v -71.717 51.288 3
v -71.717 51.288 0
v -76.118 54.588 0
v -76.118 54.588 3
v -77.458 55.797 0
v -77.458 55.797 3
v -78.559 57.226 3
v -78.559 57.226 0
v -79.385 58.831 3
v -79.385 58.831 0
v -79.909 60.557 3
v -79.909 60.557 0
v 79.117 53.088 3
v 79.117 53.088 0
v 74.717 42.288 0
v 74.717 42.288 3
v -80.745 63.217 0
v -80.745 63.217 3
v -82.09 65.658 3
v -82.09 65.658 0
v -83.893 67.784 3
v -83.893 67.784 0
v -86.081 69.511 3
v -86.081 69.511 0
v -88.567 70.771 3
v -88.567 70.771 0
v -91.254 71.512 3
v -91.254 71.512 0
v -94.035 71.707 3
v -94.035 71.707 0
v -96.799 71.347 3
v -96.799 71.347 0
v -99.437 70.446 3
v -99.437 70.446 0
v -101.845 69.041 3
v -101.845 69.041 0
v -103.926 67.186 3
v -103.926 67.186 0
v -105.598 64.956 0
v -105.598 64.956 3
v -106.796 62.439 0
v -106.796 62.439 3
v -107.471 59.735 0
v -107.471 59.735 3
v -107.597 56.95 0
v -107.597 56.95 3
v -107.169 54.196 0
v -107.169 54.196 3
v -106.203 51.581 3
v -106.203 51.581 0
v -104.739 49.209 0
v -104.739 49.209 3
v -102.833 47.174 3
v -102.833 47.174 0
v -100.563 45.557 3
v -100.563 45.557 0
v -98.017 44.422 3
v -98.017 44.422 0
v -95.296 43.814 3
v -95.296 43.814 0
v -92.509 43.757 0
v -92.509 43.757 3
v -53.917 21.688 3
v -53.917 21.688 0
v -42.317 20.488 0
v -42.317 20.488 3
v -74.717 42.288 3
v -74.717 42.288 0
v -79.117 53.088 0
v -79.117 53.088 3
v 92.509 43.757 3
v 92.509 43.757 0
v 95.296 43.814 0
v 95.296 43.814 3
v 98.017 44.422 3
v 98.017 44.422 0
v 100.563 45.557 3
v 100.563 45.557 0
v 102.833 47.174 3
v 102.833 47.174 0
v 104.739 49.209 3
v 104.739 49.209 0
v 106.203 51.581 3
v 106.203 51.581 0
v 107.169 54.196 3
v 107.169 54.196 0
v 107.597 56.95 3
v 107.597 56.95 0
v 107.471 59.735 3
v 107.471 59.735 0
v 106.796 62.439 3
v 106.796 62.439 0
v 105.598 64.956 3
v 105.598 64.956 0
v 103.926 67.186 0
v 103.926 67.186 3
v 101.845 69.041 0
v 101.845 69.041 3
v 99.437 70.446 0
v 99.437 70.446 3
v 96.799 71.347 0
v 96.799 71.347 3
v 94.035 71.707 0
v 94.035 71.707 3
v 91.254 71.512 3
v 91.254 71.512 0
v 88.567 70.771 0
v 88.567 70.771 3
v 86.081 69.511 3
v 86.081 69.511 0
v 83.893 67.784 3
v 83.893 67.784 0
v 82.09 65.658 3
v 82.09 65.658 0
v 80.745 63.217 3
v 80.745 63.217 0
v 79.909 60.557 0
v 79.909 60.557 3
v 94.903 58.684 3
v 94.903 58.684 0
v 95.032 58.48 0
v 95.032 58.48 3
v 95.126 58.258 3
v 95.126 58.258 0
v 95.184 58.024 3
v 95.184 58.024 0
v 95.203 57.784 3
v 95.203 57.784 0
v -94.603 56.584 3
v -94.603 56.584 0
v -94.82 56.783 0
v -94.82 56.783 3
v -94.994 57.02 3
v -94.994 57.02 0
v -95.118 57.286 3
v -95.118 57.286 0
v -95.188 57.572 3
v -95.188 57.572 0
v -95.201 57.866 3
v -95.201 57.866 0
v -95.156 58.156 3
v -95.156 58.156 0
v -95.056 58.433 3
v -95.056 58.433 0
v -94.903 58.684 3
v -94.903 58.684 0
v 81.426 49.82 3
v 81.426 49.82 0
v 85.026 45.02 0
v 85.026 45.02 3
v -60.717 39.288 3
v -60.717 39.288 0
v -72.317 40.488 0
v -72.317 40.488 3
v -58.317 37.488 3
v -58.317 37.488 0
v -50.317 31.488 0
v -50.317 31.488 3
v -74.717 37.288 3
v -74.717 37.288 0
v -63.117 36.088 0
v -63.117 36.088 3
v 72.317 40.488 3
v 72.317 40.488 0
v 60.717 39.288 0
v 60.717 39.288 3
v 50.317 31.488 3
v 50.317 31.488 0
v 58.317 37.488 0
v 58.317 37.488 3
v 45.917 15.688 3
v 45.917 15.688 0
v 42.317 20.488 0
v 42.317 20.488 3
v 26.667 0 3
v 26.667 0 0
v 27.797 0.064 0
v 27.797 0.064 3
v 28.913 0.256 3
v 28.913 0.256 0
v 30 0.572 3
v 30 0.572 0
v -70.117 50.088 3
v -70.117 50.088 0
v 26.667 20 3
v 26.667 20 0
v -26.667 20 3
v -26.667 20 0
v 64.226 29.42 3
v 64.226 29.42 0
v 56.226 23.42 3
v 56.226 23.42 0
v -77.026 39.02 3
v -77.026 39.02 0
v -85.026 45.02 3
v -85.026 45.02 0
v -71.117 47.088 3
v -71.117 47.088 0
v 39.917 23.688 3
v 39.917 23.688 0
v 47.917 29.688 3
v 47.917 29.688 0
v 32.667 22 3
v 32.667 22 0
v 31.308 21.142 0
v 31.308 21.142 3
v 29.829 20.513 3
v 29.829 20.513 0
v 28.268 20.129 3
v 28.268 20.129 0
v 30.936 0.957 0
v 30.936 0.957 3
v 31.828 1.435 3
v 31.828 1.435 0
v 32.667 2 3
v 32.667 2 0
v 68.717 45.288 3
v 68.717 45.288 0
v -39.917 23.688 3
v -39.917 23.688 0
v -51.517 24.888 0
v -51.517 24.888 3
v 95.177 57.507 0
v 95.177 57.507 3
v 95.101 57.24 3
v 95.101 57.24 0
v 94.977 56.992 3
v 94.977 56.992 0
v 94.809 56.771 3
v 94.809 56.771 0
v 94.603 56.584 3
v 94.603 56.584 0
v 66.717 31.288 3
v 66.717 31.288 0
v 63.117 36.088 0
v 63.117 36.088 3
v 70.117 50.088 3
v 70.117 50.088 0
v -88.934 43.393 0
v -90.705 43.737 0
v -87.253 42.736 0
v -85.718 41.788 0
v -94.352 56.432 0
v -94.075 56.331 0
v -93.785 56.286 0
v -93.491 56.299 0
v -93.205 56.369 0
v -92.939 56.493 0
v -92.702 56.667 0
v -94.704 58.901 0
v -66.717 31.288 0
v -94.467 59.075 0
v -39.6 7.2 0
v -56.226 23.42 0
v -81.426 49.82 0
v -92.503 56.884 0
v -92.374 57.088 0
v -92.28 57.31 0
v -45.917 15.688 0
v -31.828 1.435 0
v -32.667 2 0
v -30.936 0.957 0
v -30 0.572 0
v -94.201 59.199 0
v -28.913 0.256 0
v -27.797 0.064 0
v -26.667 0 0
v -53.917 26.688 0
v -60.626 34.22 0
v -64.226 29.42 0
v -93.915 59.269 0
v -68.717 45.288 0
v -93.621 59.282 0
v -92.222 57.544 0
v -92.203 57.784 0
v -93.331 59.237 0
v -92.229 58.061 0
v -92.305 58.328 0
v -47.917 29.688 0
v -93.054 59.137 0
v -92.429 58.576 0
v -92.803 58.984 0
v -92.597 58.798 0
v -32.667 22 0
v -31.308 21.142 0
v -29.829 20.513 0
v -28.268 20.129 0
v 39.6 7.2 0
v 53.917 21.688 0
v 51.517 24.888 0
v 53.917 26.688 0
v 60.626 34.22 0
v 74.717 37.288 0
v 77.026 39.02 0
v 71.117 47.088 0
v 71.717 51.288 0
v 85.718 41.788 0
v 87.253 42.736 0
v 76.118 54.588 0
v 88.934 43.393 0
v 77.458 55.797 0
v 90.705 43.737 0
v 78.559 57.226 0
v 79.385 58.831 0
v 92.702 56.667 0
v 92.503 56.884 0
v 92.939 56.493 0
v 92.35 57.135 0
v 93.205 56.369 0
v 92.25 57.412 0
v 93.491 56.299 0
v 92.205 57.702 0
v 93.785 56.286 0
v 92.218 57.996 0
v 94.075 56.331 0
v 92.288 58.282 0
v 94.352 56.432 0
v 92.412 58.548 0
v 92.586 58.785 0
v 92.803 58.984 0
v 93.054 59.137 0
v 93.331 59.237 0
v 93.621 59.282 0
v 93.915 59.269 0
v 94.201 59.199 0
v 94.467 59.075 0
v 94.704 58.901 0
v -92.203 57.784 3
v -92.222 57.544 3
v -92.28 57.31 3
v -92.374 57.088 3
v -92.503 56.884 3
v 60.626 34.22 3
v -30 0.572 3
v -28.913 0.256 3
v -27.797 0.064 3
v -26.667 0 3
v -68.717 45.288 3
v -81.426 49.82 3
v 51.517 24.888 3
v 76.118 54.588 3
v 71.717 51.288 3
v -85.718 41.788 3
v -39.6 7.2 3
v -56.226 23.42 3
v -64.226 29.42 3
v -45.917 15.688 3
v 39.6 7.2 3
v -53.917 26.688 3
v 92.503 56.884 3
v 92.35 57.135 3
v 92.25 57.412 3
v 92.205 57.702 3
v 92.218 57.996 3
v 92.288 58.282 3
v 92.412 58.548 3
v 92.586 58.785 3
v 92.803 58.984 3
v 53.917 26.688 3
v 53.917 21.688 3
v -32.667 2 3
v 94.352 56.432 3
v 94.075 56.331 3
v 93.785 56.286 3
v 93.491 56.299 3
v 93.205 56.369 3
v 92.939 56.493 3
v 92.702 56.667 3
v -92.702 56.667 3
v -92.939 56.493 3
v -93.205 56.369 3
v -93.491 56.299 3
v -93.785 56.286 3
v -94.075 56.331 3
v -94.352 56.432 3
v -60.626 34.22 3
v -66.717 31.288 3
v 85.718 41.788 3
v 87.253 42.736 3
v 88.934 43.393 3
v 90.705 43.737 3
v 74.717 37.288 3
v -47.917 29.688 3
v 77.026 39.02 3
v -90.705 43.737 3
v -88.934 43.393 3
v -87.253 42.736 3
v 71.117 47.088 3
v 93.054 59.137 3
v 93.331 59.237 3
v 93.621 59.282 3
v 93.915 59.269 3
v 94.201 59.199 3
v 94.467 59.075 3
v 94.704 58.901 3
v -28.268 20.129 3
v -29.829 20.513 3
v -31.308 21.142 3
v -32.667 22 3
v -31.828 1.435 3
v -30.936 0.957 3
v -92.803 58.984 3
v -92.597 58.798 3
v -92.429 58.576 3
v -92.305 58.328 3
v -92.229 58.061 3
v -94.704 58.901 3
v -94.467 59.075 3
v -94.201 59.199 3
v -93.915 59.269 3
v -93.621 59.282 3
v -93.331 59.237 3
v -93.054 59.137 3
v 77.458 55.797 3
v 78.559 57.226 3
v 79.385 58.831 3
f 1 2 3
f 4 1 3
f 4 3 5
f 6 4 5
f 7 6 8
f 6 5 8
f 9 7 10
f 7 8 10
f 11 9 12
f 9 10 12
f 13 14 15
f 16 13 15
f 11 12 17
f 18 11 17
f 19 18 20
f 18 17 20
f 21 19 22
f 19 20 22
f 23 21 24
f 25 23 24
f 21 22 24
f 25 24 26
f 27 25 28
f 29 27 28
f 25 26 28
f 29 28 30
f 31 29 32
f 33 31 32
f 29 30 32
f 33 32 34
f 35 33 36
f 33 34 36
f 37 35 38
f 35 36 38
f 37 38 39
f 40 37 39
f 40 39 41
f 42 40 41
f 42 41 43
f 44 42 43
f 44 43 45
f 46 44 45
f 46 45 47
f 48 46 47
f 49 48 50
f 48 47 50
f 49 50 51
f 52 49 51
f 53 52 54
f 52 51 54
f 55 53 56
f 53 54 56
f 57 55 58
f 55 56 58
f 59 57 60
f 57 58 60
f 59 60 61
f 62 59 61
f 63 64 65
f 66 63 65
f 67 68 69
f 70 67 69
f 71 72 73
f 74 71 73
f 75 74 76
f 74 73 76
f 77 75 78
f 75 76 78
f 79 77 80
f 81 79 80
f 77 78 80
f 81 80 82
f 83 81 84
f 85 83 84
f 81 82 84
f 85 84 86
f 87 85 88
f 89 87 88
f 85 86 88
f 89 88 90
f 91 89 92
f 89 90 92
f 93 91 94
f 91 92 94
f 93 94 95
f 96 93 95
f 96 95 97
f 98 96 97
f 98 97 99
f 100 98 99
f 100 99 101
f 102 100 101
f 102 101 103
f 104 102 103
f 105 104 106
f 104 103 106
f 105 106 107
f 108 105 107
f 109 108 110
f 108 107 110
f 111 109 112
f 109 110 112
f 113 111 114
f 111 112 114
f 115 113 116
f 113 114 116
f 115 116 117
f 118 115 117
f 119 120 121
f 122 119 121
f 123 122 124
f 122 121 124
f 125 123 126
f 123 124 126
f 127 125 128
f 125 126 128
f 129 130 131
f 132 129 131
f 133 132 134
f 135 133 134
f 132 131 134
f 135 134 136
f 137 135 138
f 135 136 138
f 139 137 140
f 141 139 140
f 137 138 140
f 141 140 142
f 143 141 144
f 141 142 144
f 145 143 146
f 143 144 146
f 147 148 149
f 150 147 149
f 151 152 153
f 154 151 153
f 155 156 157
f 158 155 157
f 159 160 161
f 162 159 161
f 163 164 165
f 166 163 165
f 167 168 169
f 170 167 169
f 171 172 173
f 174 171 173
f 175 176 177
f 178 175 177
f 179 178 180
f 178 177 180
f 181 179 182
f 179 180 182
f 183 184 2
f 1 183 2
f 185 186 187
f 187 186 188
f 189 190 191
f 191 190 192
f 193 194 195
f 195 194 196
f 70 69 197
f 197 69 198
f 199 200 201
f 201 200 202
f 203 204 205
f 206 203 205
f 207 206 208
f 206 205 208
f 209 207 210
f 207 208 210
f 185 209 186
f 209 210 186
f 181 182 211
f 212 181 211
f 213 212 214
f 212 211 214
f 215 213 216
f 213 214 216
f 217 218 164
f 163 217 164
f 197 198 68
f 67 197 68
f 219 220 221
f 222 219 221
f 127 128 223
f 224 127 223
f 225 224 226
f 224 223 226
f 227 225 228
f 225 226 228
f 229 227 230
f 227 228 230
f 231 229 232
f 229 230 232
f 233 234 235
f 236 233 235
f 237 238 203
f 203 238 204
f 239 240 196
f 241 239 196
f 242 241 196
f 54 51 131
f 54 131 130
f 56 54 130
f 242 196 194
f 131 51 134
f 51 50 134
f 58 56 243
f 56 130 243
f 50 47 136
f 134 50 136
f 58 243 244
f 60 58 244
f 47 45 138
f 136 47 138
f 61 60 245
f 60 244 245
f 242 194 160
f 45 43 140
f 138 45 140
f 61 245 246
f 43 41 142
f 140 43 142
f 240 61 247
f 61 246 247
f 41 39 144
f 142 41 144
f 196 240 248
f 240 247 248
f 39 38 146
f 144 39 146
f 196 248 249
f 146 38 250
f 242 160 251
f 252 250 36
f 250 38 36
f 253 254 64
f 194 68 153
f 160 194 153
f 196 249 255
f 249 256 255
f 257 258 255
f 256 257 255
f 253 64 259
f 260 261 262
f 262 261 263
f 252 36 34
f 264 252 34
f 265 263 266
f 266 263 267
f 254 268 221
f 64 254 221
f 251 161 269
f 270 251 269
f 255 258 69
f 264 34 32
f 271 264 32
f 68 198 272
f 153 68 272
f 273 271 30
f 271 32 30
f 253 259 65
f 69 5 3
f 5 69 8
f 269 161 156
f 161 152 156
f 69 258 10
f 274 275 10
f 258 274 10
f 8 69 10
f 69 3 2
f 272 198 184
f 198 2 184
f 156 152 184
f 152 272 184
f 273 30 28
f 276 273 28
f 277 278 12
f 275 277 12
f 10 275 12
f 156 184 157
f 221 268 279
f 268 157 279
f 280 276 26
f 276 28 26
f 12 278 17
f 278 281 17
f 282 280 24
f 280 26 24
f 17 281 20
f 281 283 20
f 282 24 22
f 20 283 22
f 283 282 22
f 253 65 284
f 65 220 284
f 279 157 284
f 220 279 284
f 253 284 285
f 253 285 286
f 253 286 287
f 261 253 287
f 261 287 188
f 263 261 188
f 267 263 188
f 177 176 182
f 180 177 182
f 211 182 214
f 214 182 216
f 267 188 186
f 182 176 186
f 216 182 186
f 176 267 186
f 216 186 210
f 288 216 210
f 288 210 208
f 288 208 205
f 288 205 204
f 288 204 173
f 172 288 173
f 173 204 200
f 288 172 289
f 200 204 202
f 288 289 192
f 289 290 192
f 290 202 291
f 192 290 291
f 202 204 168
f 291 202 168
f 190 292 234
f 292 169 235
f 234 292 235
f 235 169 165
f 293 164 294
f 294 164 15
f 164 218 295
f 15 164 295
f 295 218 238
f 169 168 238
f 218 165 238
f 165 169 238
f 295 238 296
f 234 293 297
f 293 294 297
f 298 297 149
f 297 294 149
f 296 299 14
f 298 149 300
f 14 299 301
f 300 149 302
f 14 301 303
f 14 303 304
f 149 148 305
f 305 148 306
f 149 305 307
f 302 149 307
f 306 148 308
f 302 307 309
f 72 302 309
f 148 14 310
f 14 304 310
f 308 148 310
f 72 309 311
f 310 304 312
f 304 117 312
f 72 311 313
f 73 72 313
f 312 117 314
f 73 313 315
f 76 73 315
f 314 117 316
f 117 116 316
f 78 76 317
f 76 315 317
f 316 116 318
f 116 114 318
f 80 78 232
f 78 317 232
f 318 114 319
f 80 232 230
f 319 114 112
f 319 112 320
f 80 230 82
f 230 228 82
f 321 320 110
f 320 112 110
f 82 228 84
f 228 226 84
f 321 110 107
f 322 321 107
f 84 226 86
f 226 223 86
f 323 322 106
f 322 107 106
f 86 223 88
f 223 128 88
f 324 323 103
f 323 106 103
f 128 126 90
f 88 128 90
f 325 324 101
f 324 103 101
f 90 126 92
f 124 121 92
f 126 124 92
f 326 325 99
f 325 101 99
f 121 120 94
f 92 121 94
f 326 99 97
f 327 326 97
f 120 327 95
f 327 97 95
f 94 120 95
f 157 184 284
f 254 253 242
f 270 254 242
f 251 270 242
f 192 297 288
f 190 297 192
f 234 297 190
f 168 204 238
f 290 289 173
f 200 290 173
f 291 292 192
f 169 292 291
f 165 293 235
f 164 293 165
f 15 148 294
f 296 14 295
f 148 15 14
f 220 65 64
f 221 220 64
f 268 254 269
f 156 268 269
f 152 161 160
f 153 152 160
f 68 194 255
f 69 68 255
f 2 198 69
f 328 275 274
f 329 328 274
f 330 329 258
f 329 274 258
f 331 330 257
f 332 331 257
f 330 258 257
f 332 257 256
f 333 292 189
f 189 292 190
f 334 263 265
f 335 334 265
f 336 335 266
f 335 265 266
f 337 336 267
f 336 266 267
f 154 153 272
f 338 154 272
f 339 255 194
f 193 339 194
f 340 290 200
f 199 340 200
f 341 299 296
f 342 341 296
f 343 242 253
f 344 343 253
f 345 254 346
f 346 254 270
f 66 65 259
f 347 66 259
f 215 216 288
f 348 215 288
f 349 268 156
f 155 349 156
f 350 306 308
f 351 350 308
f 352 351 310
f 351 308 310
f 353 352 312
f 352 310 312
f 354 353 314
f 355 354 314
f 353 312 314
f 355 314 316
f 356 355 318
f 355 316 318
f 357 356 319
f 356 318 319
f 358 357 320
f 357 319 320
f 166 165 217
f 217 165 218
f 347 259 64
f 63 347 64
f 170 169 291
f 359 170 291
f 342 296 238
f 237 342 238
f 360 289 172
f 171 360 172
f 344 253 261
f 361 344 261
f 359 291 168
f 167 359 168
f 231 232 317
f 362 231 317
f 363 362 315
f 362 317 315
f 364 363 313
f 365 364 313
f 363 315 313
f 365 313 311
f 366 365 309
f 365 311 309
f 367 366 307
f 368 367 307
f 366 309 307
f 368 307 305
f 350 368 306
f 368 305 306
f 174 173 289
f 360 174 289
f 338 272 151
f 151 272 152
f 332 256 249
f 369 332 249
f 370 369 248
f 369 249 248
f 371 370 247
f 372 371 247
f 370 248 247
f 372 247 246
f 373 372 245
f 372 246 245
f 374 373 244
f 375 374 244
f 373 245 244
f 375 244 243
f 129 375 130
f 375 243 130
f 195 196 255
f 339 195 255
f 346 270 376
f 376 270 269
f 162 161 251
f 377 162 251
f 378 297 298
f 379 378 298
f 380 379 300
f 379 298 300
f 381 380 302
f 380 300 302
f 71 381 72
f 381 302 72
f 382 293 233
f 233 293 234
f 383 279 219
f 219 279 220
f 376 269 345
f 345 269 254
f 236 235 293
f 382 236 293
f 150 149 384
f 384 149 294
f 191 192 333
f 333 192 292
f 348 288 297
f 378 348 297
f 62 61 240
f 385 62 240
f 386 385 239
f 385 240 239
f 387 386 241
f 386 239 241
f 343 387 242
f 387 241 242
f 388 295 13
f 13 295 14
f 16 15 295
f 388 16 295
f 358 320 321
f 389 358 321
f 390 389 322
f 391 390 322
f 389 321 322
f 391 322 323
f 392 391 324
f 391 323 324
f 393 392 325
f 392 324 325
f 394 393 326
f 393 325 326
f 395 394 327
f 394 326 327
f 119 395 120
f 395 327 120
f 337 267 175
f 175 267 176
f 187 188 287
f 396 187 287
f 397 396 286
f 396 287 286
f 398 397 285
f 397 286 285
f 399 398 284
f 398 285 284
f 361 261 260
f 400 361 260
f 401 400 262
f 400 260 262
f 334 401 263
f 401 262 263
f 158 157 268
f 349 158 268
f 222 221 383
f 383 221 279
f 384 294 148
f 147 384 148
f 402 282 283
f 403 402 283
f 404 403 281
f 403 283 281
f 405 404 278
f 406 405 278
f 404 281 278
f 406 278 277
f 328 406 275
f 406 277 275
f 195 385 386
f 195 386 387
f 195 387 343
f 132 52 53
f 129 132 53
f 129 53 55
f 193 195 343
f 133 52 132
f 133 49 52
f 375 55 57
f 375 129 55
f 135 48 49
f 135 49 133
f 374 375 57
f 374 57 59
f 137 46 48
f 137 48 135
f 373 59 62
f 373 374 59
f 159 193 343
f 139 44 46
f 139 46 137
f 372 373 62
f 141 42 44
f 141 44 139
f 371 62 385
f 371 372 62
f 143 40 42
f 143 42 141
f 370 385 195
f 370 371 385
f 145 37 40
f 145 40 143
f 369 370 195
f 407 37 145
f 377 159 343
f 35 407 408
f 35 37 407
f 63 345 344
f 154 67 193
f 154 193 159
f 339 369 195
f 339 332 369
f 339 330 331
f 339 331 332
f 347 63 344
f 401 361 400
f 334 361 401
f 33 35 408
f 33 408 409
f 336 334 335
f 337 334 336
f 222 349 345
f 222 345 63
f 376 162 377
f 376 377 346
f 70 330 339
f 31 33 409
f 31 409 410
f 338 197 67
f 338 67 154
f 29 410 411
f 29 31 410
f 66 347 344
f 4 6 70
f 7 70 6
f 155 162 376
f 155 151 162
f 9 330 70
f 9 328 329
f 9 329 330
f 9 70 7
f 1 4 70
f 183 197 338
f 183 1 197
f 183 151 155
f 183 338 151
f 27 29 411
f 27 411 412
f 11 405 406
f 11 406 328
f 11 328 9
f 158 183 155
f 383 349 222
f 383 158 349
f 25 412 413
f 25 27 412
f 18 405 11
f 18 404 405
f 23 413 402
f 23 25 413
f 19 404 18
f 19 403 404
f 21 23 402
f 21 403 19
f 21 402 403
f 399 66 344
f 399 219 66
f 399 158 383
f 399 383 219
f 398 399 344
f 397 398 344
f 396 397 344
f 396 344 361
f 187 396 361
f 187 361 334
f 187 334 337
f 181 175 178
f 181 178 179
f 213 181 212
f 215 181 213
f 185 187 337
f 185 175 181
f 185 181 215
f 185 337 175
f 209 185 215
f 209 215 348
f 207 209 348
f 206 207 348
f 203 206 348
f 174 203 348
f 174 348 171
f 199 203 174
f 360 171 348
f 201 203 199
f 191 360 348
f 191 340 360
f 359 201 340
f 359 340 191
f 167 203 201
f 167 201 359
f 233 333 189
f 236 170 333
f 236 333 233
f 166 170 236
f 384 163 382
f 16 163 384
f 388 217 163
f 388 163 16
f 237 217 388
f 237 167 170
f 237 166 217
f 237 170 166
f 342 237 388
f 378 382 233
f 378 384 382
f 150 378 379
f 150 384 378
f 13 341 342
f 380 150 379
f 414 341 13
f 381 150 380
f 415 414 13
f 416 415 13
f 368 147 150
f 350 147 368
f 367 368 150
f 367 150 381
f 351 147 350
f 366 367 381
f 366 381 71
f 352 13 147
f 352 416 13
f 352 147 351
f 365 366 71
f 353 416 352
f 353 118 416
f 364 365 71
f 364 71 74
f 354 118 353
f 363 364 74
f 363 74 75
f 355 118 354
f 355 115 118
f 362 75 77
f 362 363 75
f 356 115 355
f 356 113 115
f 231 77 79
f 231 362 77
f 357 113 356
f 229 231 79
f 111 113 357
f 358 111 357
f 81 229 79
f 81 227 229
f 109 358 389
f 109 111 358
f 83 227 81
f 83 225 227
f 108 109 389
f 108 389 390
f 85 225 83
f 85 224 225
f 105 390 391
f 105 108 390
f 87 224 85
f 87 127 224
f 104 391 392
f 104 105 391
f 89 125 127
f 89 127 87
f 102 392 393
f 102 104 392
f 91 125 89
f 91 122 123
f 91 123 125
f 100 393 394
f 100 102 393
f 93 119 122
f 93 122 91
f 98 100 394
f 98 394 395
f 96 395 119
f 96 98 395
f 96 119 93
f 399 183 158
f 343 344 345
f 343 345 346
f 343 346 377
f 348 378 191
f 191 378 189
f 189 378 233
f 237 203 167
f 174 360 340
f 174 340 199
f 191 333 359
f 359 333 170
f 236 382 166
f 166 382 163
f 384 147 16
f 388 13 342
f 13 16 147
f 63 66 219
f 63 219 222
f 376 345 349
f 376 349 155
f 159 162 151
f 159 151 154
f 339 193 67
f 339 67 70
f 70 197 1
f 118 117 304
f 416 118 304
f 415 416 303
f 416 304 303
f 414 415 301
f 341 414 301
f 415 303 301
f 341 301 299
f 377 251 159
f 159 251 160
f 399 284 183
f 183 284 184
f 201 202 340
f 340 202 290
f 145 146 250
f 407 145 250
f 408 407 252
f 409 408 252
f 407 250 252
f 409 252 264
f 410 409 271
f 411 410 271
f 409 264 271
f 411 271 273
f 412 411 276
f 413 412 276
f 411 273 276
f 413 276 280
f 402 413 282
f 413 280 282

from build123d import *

# Parameters (mm, degrees)
F1_DEPTH = 3


with BuildPart() as f1:
    # F0 (on Top) → F1 (new body)
    with BuildSketch(Plane.XY):
        with BuildLine():
            Line((0, 20), (-26.666667, 20))
            ThreePointArc((-26.666667, 20), (-29.828944, 20.513167), (-32.666667, 22))
            Line((-32.666667, 22), (-30, 20))
            Line((-30, 20), (-30, 0.57191))
            ThreePointArc((-30, 0.57191), (-28.357686, 0.144014), (-26.666667, 0))
            Line((-26.666667, 0), (0, 0))
            Line((0, 0), (0, 10))
            Line((0, 10), (0, 20))
        make_face()
        with BuildLine():
            Line((26.666667, 20), (0, 20))
            Line((0, 20), (0, 10))
            Line((0, 10), (0, 0))
            Line((0, 0), (26.666667, 0))
            ThreePointArc((26.666667, 0), (28.357686, 0.144014), (30, 0.57191))
            Line((30, 0.57191), (30, 20))
            Line((30, 20), (32.666667, 22))
            ThreePointArc((32.666667, 22), (29.828944, 20.513167), (26.666667, 20))
        make_face()
        with BuildLine():
            Line((-30, 20), (-32.666667, 22))
            Line((-32.666667, 22), (-70.117305, 50.087979))
            Line((-70.117305, 50.087979), (-71.717305, 51.287979))
            Line((-71.717305, 51.287979), (-76.11797, 54.588477))
            ThreePointArc((-76.11797, 54.588477), (-78.558883, 57.226483), (-79.909473, 60.557104))
            ThreePointArc((-79.909473, 60.557104), (-104.817576, 66.113182), (-92.509473, 43.757104))
            ThreePointArc((-92.509473, 43.757104), (-88.933911, 43.393113), (-85.71797, 41.788477))
            Line((-85.71797, 41.788477), (-39.6, 7.2))
            Line((-39.6, 7.2), (-32.666667, 2))
            ThreePointArc((-32.666667, 2), (-31.387645, 1.184538), (-30, 0.57191))
            Line((-30, 0.57191), (-30, 20))
        make_face()
        Polygon((-64.226276, 29.419657), (-60.626276, 34.219657), (-56.226276, 23.419657), align=None, mode=Mode.SUBTRACT)
        Polygon((-74.7174, 37.28805), (-63.1174, 36.08805), (-66.7174, 31.28805), align=None, mode=Mode.SUBTRACT)
        Polygon((-50.3174, 31.488), (-53.9174, 26.688), (-58.3174, 37.488), align=None, mode=Mode.SUBTRACT)
        Polygon((-53.9174, 21.688), (-42.3174, 20.488), (-45.9174, 15.688), align=None, mode=Mode.SUBTRACT)
        Polygon((-39.9174, 23.688), (-51.5174, 24.888), (-47.9174, 29.688), align=None, mode=Mode.SUBTRACT)
        Polygon((-77.026276, 39.019707), (-85.026276, 45.019707), (-81.426276, 49.819707), align=None, mode=Mode.SUBTRACT)
        Polygon((-60.7174, 39.28805), (-72.3174, 40.48805), (-68.7174, 45.28805), align=None, mode=Mode.SUBTRACT)
        Polygon((-71.1174, 47.08805), (-74.7174, 42.28805), (-79.1174, 53.08805), align=None, mode=Mode.SUBTRACT)
        with BuildLine():
            ThreePointArc((-92.803023, 58.984095), (-92.361383, 58.454915), (-92.203023, 57.784095))
            ThreePointArc((-92.203023, 57.784095), (-92.279998, 57.309753), (-92.503023, 56.884095))
            ThreePointArc((-92.503023, 56.884095), (-93.490891, 56.299171), (-94.603023, 56.584095))
            ThreePointArc((-94.603023, 56.584095), (-95.187948, 57.571963), (-94.903023, 58.684095))
            ThreePointArc((-94.903023, 58.684095), (-93.915155, 59.269019), (-92.803023, 58.984095))
        make_face(mode=Mode.SUBTRACT)
        with BuildLine():
            Line((70.117305, 50.087979), (32.666667, 22))
            Line((32.666667, 22), (30, 20))
            Line((30, 20), (30, 0.57191))
            ThreePointArc((30, 0.57191), (31.387645, 1.184538), (32.666667, 2))
            Line((32.666667, 2), (39.6, 7.2))
            Line((39.6, 7.2), (85.71797, 41.788477))
            ThreePointArc((85.71797, 41.788477), (88.933911, 43.393113), (92.509473, 43.757104))
            ThreePointArc((92.509473, 43.757104), (104.817576, 66.113182), (79.909473, 60.557104))
            ThreePointArc((79.909473, 60.557104), (78.558883, 57.226483), (76.11797, 54.588477))
            Line((76.11797, 54.588477), (71.717305, 51.287979))
            Line((71.717305, 51.287979), (70.117305, 50.087979))
        make_face()
        Polygon((42.3174, 20.488), (53.9174, 21.688), (45.9174, 15.688), align=None, mode=Mode.SUBTRACT)
        Polygon((47.9174, 29.688), (51.5174, 24.888), (39.9174, 23.688), align=None, mode=Mode.SUBTRACT)
        Polygon((60.626276, 34.219657), (64.226276, 29.419657), (56.226276, 23.419657), align=None, mode=Mode.SUBTRACT)
        Polygon((58.3174, 37.488), (53.9174, 26.688), (50.3174, 31.488), align=None, mode=Mode.SUBTRACT)
        Polygon((74.7174, 37.28805), (66.7174, 31.28805), (63.1174, 36.08805), align=None, mode=Mode.SUBTRACT)
        Polygon((68.7174, 45.28805), (72.3174, 40.48805), (60.7174, 39.28805), align=None, mode=Mode.SUBTRACT)
        Polygon((81.426276, 49.819707), (85.026276, 45.019707), (77.026276, 39.019707), align=None, mode=Mode.SUBTRACT)
        Polygon((79.1174, 53.08805), (74.7174, 42.28805), (71.1174, 47.08805), align=None, mode=Mode.SUBTRACT)
        with BuildLine():
            ThreePointArc((94.903023, 58.684095), (95.126048, 58.258437), (95.203023, 57.784095))
            ThreePointArc((95.203023, 57.784095), (95.044664, 57.113275), (94.603023, 56.584095))
            ThreePointArc((94.603023, 56.584095), (93.490891, 56.299171), (92.503023, 56.884095))
            ThreePointArc((92.503023, 56.884095), (92.218099, 57.996227), (92.803023, 58.984095))
            ThreePointArc((92.803023, 58.984095), (93.915155, 59.269019), (94.903023, 58.684095))
        make_face(mode=Mode.SUBTRACT)
    extrude(amount=F1_DEPTH)


solid = f1.part
